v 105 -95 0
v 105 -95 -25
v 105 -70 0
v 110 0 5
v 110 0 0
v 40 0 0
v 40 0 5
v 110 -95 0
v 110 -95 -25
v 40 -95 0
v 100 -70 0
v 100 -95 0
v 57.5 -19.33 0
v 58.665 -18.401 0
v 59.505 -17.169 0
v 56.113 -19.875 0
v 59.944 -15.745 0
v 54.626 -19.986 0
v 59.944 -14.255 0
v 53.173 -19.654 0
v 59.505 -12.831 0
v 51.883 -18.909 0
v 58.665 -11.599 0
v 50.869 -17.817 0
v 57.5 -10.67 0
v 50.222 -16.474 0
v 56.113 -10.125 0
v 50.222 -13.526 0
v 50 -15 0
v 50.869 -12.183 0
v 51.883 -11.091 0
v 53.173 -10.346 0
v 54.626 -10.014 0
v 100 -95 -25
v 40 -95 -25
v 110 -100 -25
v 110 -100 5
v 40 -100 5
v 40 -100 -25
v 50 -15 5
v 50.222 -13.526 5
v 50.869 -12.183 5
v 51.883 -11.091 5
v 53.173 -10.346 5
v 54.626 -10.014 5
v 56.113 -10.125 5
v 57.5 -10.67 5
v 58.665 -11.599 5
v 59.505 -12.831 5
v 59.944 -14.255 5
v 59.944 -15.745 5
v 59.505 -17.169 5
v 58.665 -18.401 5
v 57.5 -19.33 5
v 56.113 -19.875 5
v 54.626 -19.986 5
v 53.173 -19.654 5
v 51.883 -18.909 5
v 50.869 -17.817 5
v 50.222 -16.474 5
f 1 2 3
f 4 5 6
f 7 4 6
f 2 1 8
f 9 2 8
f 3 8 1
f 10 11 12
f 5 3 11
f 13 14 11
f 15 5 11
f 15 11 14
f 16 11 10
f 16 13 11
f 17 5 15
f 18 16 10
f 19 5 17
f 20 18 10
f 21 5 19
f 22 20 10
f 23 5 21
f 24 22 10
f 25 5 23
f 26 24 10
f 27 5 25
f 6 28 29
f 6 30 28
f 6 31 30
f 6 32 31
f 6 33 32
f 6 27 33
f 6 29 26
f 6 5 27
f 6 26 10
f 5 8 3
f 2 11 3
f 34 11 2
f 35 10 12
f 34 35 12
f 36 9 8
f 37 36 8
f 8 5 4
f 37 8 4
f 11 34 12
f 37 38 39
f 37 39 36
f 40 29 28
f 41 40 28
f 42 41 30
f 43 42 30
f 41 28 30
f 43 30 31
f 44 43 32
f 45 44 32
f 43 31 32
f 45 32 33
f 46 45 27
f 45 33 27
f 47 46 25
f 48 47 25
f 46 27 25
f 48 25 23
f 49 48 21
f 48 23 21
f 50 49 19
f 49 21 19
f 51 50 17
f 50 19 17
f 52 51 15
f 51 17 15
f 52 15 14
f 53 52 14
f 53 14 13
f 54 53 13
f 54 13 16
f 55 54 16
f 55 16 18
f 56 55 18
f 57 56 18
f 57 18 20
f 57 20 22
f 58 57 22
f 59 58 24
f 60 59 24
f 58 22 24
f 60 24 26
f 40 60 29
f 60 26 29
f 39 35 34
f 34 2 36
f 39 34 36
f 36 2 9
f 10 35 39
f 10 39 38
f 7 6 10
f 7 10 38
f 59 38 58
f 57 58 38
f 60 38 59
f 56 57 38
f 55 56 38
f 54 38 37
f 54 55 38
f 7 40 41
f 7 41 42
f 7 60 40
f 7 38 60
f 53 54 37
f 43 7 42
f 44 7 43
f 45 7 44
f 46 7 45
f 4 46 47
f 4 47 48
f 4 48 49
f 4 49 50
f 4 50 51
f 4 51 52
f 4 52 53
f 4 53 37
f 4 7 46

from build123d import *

# Parameters (mm, degrees)
BOSS_EXTRUDE1_DEPTH = 5
SKETCH9_R           = 5
CUT_EXTRUDE4_DEPTH  = 10
SKETCH10_W          = 45.027348062
SKETCH10_H          = 31.505755331
CUT_EXTRUDE5_DEPTH  = 10
SKETCH11_W          = 70
SKETCH11_H          = 95
BOSS_EXTRUDE2_DEPTH = 5
SKETCH12_R          = 5
CUT_EXTRUDE6_DEPTH  = 5
SKETCH13_W          = 70
SKETCH13_H          = 30
BOSS_EXTRUDE3_DEPTH = 5
BOSS_EXTRUDE4_DEPTH = 5


with BuildPart() as part:
    # Sketch1 → Boss-Extrude1 (new body)
    with BuildSketch(Plane.XY):
        with BuildLine():
            Line((5, 0), (70, 0))
            Line((70, 0), (70, -30))
            Line((70, -30), (70, -95))
            Line((70, -95), (40, -95))
            Line((40, -95), (40, -30))
            Line((40, -30), (5, -30))
            ThreePointArc((5, -30), (1.464466094, -28.535533906), (0, -25))
            Line((0, -25), (0, -5))
            ThreePointArc((0, -5), (1.464466094, -1.464466094), (5, 0))
        make_face()
    boss_extrude1 = extrude(amount=BOSS_EXTRUDE1_DEPTH)

    # Mirror4: Boss-Extrude1 across plane
    add(boss_extrude1.mirror(Plane.ZY.offset(-55)))

    # Sketch9 → Cut-Extrude4 (cut)
    with BuildSketch(Plane(origin=(0, 0, 0), x_dir=(-1, 0, 0), z_dir=(0, 0, -1))):
        with Locations((-95, -15)):
            Circle(SKETCH9_R)
    extrude(amount=-CUT_EXTRUDE4_DEPTH, mode=Mode.SUBTRACT)

    # Sketch10 → Cut-Extrude5 (cut)
    with BuildSketch(Plane(origin=(0, 0, 0), x_dir=(-1, 0, 0), z_dir=(0, 0, -1))):
        with Locations((-17.486325969, -14.247122335)):
            Rectangle(SKETCH10_W, SKETCH10_H)
    extrude(amount=-CUT_EXTRUDE5_DEPTH, mode=Mode.SUBTRACT)

    # Sketch11 → Boss-Extrude2 (add)
    with BuildSketch(Plane(origin=(0, 0, 0), x_dir=(-1, 0, 0), z_dir=(0, 0, -1))):
        with Locations((-75, -47.5)):
            Rectangle(SKETCH11_W, SKETCH11_H)
    extrude(amount=-BOSS_EXTRUDE2_DEPTH)

    # Sketch12 → Cut-Extrude6 (cut)
    with BuildSketch(Plane(origin=(0, 0, 0), x_dir=(-1, 0, 0), z_dir=(0, 0, -1))):
        with Locations((-55, -15)):
            Circle(SKETCH12_R)
    extrude(amount=-CUT_EXTRUDE6_DEPTH, mode=Mode.SUBTRACT)

    # Sketch13 → Boss-Extrude3 (add)
    with BuildSketch(Plane.XZ.offset(95)):
        with Locations((75, -10)):
            Rectangle(SKETCH13_W, SKETCH13_H)
    extrude(amount=BOSS_EXTRUDE3_DEPTH)

    # Sketch14 → Boss-Extrude4 (add)
    with BuildSketch(Plane(origin=(100, 0, 0), x_dir=(0, 0, -1), z_dir=(1, 0, 0))):
        Polygon((0, -70), (25, -95), (0, -95), align=None)
    extrude(amount=BOSS_EXTRUDE4_DEPTH)


solid = part.part
